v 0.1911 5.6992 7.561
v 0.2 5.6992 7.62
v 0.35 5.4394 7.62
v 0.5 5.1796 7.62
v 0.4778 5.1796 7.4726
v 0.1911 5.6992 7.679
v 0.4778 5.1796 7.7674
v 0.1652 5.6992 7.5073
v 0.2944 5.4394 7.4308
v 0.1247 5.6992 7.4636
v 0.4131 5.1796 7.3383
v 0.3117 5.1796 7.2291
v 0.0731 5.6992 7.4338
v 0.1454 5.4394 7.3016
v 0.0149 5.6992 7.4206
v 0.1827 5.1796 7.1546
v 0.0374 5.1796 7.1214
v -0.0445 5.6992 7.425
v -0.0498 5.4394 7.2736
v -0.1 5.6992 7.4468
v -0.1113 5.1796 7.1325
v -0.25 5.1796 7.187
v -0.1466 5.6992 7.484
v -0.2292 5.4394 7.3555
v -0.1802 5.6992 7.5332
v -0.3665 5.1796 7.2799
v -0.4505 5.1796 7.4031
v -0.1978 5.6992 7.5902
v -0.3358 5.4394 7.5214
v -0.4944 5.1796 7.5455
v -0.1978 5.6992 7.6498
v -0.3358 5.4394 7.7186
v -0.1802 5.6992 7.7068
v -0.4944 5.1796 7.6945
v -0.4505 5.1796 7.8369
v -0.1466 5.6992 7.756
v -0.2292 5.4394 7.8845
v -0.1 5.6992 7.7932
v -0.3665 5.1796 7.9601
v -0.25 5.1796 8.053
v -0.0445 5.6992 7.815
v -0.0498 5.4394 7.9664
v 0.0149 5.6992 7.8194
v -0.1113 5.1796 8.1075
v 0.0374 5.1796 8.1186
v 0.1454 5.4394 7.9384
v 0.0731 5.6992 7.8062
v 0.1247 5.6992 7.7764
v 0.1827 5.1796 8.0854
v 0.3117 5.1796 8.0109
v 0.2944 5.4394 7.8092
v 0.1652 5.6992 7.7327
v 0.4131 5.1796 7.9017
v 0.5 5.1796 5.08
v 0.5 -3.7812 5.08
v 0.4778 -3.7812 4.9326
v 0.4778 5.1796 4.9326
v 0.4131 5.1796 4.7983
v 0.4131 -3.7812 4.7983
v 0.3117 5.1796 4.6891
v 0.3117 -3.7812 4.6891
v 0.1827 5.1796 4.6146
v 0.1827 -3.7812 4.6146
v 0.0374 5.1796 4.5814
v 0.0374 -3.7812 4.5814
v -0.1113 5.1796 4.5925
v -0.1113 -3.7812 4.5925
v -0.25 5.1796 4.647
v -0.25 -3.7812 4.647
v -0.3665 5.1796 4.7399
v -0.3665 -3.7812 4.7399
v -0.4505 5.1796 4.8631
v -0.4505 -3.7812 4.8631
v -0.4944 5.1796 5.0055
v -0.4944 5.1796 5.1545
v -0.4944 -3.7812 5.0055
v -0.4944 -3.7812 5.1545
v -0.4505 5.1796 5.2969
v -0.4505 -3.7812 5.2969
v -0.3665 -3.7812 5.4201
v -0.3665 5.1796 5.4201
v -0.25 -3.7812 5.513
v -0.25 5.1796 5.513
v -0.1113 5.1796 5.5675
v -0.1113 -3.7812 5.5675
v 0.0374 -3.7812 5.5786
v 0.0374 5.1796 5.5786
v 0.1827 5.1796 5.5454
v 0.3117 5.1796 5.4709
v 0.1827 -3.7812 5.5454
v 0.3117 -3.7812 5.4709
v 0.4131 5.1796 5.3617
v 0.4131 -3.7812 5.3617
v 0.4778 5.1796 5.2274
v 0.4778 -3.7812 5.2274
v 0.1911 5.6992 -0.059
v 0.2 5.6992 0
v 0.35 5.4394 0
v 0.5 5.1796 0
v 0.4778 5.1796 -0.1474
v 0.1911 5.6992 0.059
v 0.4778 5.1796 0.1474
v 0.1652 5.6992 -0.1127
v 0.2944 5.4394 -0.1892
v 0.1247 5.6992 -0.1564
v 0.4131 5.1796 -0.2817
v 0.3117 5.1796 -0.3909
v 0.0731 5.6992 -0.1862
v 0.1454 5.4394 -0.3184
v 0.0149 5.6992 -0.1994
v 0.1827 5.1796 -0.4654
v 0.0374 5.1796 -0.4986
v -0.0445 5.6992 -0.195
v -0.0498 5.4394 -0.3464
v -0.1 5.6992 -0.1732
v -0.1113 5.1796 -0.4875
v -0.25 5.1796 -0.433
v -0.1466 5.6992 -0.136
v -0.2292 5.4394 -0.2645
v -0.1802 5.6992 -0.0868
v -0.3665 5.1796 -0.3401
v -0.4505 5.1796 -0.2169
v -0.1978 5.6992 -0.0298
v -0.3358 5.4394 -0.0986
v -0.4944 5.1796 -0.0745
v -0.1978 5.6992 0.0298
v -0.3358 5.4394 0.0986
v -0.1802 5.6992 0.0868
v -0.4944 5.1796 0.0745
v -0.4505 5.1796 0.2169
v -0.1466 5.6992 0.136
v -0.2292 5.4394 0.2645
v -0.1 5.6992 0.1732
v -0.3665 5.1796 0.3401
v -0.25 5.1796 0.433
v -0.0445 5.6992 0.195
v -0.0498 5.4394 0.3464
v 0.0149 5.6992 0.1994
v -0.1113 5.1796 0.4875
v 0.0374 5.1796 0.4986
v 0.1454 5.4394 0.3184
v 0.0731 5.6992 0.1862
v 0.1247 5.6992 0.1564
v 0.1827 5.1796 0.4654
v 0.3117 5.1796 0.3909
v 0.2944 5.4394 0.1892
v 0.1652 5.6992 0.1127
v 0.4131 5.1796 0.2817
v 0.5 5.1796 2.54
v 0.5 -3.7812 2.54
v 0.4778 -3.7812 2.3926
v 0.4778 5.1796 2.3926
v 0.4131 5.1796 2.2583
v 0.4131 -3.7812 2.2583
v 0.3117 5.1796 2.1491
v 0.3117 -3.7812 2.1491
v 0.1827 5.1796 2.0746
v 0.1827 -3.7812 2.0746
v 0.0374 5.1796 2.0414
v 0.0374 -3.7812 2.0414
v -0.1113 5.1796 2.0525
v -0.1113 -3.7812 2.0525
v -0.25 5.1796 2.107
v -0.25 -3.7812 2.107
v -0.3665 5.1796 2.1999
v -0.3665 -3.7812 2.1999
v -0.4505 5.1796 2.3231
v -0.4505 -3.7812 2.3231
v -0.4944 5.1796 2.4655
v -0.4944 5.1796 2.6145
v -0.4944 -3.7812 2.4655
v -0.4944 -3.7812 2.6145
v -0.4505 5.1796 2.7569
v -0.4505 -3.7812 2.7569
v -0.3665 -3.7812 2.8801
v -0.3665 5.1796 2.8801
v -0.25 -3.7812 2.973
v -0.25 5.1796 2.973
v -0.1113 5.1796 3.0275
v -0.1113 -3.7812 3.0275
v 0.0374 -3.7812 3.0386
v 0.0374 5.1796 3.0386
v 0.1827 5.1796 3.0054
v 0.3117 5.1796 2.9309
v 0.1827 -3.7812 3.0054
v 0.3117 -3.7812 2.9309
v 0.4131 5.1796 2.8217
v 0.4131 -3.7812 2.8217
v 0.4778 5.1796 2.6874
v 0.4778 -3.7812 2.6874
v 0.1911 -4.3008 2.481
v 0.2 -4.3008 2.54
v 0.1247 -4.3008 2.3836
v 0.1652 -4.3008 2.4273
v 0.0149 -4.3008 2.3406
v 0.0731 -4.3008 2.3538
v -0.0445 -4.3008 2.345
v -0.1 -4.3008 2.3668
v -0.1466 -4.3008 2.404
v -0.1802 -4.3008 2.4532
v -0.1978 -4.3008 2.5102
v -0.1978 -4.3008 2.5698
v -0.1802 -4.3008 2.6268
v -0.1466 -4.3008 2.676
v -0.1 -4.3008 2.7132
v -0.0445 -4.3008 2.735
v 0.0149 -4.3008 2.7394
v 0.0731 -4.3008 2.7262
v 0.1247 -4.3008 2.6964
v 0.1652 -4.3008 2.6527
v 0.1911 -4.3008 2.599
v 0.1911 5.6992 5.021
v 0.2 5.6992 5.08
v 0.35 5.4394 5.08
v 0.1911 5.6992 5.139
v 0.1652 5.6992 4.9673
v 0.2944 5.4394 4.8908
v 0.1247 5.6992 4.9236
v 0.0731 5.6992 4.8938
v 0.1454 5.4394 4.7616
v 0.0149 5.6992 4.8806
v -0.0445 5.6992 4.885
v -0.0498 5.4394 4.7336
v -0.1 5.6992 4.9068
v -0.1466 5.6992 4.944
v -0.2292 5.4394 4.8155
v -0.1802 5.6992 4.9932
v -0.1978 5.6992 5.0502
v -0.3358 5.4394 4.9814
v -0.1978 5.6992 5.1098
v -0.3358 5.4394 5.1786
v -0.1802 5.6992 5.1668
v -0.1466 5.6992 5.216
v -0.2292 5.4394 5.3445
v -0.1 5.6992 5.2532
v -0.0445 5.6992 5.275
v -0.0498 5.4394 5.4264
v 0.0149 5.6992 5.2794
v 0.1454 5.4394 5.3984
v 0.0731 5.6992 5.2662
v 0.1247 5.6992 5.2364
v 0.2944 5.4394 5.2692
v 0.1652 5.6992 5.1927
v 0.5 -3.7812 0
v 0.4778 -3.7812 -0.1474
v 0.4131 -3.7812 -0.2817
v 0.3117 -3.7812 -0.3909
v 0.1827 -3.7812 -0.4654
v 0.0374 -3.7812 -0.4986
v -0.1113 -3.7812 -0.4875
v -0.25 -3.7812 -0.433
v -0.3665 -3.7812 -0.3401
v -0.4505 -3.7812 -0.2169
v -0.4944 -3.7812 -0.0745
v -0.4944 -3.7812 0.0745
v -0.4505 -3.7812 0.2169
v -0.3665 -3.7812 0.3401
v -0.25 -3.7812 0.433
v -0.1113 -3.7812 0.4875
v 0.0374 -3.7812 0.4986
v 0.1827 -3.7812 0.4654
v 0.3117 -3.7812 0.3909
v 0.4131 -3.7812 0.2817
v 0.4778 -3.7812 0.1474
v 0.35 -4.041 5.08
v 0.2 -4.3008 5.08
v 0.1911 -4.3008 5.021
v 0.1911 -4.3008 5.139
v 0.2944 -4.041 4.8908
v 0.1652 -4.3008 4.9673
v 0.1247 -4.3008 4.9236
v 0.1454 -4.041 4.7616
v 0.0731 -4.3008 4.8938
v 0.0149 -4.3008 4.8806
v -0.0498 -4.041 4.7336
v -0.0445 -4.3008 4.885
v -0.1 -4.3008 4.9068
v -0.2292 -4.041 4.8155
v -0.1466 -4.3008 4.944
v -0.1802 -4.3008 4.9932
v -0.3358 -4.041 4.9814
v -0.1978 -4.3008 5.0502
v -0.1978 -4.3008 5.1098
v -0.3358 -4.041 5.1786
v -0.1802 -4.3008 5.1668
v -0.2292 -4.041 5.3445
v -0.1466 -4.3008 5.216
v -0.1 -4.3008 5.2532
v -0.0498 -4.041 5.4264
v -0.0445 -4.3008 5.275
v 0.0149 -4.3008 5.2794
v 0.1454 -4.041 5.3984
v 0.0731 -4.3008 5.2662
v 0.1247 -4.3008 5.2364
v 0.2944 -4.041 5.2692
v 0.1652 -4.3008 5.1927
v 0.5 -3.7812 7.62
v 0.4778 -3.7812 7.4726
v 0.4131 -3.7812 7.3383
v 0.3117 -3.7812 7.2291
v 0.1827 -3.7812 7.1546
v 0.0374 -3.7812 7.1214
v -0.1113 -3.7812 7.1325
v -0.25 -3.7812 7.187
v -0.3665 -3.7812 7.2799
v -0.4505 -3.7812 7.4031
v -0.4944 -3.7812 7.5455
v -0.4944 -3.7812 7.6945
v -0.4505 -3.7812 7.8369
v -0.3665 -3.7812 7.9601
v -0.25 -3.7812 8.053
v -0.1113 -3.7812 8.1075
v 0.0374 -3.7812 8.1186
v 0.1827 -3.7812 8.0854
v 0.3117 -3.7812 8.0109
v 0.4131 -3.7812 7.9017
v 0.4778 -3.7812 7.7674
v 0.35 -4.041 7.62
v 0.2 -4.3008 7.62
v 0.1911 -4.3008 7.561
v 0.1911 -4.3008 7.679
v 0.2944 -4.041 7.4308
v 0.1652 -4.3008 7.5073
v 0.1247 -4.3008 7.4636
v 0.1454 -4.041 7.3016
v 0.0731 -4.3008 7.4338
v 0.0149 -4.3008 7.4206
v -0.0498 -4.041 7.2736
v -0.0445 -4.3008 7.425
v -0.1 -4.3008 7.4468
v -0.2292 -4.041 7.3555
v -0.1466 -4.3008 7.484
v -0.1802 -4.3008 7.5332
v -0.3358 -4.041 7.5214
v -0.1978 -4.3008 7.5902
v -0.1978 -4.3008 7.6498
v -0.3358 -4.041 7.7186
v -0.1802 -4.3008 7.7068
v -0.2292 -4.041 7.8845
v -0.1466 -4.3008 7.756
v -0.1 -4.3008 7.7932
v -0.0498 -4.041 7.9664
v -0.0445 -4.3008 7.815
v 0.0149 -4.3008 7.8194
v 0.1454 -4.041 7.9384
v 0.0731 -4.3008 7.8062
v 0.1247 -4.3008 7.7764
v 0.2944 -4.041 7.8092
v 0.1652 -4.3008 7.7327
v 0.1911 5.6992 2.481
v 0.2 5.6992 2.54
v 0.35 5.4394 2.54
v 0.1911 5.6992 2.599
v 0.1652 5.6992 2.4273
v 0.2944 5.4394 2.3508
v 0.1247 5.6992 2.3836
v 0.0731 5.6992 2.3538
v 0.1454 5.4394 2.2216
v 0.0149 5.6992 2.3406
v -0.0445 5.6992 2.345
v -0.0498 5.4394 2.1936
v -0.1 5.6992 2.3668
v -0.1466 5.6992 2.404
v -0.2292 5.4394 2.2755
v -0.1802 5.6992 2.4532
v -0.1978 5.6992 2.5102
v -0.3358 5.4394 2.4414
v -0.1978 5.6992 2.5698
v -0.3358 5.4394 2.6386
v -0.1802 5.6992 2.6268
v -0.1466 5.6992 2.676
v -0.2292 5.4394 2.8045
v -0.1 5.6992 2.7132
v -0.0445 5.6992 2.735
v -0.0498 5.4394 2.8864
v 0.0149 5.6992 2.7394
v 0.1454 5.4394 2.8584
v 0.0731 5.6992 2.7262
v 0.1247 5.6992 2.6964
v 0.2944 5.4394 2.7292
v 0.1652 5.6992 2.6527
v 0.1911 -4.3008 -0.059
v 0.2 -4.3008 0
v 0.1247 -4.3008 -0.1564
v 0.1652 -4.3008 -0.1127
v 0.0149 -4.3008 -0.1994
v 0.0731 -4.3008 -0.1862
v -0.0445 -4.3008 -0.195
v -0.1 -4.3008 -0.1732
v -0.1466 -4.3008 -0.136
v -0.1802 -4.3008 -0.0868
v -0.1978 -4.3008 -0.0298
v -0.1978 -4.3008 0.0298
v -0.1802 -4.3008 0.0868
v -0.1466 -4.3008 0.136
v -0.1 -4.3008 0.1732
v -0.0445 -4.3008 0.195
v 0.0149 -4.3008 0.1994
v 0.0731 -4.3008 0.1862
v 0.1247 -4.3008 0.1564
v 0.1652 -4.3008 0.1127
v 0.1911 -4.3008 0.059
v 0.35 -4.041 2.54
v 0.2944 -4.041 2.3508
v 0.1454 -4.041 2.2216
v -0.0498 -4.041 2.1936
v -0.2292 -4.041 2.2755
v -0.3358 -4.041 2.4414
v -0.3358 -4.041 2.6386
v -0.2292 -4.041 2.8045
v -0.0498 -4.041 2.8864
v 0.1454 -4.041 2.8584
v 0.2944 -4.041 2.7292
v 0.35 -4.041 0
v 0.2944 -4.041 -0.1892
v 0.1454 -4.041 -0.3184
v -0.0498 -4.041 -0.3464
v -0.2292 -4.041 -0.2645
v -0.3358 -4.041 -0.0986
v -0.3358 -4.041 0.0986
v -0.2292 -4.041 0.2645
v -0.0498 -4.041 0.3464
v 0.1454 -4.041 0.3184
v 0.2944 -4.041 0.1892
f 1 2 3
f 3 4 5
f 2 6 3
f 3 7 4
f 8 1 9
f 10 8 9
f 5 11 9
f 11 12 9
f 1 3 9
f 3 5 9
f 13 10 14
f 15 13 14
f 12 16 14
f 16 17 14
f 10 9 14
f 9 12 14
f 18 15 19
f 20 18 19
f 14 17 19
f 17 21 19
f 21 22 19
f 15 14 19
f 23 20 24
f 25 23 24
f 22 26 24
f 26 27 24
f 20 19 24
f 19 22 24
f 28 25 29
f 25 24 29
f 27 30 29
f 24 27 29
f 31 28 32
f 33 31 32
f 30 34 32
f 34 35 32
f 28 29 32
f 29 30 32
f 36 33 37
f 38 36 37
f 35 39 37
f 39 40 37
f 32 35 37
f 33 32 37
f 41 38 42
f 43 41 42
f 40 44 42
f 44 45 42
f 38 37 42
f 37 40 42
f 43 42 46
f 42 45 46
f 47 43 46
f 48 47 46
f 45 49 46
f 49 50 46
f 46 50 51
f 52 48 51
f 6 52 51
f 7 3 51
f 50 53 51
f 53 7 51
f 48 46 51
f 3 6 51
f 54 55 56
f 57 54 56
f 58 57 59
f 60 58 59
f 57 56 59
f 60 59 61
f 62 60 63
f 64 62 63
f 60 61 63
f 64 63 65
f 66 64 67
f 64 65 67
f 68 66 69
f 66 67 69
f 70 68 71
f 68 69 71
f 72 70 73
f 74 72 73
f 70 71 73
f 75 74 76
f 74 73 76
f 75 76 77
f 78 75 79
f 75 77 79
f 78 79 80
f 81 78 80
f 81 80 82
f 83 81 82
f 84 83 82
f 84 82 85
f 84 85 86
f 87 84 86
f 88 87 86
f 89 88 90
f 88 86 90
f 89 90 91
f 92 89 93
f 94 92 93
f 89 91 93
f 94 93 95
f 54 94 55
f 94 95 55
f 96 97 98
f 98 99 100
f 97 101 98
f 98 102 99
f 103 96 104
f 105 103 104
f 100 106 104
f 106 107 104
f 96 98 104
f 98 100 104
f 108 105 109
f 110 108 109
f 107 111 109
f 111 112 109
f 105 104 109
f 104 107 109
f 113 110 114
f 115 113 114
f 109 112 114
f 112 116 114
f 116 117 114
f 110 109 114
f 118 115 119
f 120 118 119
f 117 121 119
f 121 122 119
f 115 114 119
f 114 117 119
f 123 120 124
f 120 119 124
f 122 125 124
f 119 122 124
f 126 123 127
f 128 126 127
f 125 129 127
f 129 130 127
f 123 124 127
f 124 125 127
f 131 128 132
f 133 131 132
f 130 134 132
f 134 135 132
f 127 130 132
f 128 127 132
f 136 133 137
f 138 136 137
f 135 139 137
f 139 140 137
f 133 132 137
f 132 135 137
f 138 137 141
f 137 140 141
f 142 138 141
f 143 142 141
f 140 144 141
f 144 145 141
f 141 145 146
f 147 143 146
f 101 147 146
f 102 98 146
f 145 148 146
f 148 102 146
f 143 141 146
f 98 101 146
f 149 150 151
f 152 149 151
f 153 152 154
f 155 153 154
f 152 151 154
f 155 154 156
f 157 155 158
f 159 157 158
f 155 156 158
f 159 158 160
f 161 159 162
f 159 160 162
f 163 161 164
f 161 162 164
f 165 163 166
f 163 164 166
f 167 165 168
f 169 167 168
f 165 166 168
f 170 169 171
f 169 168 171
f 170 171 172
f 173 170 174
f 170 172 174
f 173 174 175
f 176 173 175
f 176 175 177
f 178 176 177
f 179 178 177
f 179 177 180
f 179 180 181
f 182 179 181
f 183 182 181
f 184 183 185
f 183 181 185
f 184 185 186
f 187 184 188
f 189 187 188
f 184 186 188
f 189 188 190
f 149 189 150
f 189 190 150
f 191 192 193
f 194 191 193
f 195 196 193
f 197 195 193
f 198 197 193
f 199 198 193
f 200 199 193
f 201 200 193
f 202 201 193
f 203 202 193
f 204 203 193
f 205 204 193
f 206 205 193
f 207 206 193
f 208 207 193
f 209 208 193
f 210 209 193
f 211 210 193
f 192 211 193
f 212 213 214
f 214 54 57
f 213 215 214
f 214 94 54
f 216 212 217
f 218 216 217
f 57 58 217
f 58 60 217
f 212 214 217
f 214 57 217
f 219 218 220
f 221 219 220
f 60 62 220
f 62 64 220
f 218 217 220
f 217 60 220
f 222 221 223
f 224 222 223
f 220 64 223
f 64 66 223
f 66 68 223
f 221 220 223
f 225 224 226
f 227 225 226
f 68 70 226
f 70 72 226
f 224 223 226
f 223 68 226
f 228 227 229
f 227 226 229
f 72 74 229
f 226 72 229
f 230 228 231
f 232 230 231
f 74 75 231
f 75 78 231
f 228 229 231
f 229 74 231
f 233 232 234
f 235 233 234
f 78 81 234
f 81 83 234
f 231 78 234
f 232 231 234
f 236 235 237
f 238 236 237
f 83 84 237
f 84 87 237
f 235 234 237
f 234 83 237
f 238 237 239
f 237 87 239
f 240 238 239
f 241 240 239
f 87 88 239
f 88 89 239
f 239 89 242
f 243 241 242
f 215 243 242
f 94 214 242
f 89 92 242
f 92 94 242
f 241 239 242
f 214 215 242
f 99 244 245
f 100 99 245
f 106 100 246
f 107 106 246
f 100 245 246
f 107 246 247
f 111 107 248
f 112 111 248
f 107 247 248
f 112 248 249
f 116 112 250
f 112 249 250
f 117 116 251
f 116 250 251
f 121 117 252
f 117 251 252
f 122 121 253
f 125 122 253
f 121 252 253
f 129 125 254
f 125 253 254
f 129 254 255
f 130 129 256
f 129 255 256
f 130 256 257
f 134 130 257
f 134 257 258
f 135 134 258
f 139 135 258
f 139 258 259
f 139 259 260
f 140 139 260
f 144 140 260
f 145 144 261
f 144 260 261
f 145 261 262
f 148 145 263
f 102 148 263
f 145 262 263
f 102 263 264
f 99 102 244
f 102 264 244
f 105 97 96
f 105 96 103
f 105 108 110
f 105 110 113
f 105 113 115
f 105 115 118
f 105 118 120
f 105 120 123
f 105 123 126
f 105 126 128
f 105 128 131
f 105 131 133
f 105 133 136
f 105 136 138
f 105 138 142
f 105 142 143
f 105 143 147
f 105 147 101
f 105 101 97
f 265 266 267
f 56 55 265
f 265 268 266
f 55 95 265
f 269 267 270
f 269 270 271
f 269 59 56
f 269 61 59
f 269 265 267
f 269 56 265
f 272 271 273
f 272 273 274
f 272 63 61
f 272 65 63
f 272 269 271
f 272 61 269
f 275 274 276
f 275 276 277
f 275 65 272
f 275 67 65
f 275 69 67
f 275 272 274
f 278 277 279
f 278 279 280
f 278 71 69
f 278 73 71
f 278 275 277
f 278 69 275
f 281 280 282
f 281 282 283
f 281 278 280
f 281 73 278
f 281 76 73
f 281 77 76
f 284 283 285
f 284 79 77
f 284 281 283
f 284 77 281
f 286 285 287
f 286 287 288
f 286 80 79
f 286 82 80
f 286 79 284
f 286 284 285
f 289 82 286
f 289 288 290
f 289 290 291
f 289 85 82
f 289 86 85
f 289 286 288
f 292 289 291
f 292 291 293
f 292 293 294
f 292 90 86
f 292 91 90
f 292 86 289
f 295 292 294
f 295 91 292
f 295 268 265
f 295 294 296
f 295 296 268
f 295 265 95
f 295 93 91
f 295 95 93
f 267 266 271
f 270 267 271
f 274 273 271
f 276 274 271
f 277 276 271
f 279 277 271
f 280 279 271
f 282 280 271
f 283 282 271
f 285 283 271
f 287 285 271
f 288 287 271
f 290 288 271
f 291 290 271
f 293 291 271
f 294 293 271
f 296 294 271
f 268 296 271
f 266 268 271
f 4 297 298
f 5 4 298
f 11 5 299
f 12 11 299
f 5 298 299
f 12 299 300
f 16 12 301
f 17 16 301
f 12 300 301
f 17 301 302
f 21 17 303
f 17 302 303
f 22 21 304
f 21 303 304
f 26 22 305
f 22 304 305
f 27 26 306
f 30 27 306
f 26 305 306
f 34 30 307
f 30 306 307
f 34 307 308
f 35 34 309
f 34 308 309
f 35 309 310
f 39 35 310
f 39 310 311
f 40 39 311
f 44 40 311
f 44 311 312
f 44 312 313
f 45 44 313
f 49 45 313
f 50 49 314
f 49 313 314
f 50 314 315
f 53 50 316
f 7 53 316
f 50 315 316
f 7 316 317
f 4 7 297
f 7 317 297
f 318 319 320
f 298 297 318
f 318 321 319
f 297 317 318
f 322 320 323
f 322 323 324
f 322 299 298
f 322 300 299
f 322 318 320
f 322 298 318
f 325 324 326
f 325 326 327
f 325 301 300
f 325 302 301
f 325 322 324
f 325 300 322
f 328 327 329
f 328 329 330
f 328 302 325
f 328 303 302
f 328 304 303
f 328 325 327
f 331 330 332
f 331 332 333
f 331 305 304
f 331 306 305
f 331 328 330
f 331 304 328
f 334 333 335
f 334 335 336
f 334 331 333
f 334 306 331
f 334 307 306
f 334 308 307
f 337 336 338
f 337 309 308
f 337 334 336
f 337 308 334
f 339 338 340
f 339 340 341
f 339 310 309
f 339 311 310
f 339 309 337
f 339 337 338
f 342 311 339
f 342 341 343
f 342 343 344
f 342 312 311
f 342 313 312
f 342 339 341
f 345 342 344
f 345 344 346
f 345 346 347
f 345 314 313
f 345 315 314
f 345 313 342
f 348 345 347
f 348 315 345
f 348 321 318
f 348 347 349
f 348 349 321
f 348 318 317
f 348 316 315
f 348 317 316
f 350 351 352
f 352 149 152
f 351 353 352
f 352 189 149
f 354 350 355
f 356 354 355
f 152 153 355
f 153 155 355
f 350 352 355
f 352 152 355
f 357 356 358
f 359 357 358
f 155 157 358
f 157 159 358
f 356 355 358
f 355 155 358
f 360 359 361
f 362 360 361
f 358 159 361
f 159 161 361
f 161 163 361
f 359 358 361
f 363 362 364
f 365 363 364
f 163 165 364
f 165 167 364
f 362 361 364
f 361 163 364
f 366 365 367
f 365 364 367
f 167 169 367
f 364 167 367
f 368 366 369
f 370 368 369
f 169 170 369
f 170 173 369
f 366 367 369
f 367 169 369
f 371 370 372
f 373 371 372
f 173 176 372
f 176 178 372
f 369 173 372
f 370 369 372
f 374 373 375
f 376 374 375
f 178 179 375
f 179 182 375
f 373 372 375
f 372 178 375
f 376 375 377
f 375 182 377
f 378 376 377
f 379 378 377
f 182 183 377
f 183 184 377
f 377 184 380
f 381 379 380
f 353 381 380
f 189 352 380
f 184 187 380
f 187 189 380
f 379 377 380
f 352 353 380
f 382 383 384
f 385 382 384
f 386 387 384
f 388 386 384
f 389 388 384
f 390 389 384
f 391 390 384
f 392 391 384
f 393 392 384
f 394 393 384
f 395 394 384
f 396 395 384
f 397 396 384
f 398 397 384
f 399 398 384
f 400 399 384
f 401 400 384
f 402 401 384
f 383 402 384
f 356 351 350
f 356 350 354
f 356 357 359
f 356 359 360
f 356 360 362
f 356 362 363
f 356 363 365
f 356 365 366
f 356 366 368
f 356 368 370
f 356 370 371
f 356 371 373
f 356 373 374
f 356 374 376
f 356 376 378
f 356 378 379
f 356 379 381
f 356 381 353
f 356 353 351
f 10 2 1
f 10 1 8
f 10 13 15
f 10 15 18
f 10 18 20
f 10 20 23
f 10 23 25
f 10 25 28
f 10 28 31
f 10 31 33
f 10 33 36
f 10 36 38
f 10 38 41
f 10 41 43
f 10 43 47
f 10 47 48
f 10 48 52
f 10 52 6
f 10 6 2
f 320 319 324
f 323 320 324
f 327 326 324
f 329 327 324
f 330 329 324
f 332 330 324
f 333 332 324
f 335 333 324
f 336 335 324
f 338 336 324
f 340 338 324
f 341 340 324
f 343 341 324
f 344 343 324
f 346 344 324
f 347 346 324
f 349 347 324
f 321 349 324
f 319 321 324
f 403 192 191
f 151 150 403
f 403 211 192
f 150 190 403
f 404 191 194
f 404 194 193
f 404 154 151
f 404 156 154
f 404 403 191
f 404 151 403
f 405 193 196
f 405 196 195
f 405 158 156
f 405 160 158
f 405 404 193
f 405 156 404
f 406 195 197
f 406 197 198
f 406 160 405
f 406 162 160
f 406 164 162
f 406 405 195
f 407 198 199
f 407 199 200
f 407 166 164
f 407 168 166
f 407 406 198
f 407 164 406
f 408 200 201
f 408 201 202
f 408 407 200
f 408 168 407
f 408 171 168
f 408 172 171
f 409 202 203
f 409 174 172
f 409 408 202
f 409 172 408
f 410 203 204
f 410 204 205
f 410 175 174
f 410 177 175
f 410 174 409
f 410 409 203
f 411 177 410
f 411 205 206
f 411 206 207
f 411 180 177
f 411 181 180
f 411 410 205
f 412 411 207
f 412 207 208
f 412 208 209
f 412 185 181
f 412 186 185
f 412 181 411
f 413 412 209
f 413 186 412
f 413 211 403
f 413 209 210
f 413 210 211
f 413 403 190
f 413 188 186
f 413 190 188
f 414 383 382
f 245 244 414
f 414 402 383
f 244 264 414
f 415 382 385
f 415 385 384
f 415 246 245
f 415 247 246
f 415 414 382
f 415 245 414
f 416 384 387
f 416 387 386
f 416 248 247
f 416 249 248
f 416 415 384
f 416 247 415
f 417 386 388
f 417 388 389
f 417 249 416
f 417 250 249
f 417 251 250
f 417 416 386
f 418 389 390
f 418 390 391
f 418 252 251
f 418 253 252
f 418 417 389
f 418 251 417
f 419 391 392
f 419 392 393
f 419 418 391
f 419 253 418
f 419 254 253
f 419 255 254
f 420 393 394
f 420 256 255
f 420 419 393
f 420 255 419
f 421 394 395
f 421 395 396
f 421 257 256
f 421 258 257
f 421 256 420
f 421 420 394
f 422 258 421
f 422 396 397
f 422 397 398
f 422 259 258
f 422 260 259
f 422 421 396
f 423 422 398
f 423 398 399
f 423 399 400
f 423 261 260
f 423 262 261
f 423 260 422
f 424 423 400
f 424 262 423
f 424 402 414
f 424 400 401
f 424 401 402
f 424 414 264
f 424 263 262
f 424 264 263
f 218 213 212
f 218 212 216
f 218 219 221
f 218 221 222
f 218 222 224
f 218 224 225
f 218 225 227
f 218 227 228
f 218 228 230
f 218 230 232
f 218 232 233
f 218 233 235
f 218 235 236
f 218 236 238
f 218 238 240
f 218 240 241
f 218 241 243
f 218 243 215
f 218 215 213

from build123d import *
from OCP.BRepFilletAPI import BRepFilletAPI_MakeChamfer

# Parameters (mm, degrees)
SWEEP1_START     = -4.300813064
SWEEP1_OUTLINE_R = 0.5
SWEEP1_DEPTH     = 10
CHAMFER1_SIZE    = 0.3
CHAMFER1_SIZE2   = 0.519615242
LPATTERN1_COUNT  = 4
LPATTERN1_PITCH  = 2.54


# Read off the part's stored shape, not the designer's step: Sweep1
with BuildPart() as part:
    # Sweep1 outline → Sweep1 (new body)
    with BuildSketch(Plane(origin=(0, 0, 0), x_dir=(1, 0, 0), z_dir=(0, 1, 0)).offset(SWEEP1_START)):
        Circle(SWEEP1_OUTLINE_R)
    extrude(amount=SWEEP1_DEPTH)

    # Chamfer1: one chamfer whose edges measure the first distance from different faces: ONE call of the kernel's chamfer builder (chamfer() names one face for all edges)
    chamfer1_edges_1 = [part.edges().sort_by_distance(p)[0] for p in [
        (-0.5, -4.300813064, 0),
    ]]
    chamfer1_side_1 = [part.faces().sort_by_distance(p)[0] for p in [
        (0, -4.300813064, 0),
    ]]
    chamfer1_edges_2 = [part.edges().sort_by_distance(p)[0] for p in [
        (-0.5, 5.699186936, 0),
    ]]
    chamfer1_side_2 = [part.faces().sort_by_distance(p)[0] for p in [
        (0, 5.699186936, 0),
    ]]
    chamfer1 = BRepFilletAPI_MakeChamfer(part.part.solid().wrapped)
    for e in chamfer1_edges_1:
        chamfer1.Add(CHAMFER1_SIZE, CHAMFER1_SIZE2, e.wrapped, chamfer1_side_1[0].wrapped)  # the first distance lies on this face
    for e in chamfer1_edges_2:
        chamfer1.Add(CHAMFER1_SIZE, CHAMFER1_SIZE2, e.wrapped, chamfer1_side_2[0].wrapped)  # the first distance lies on this face
    add(Compound.cast(chamfer1.Shape()), mode=Mode.REPLACE)


with BuildPart() as lpattern1_1:
    # LPattern1: pattern copy
    add(part.part.moved(Location(Vector(0, 0, 1) * (1 * LPATTERN1_PITCH))))


with BuildPart() as lpattern1_2:
    # LPattern1: pattern copy
    add(part.part.moved(Location(Vector(0, 0, 1) * (2 * LPATTERN1_PITCH))))


with BuildPart() as lpattern1_3:
    # LPattern1: pattern copy
    add(part.part.moved(Location(Vector(0, 0, 1) * (3 * LPATTERN1_PITCH))))


solid = Compound([part.part, lpattern1_1.part, lpattern1_2.part, lpattern1_3.part])
